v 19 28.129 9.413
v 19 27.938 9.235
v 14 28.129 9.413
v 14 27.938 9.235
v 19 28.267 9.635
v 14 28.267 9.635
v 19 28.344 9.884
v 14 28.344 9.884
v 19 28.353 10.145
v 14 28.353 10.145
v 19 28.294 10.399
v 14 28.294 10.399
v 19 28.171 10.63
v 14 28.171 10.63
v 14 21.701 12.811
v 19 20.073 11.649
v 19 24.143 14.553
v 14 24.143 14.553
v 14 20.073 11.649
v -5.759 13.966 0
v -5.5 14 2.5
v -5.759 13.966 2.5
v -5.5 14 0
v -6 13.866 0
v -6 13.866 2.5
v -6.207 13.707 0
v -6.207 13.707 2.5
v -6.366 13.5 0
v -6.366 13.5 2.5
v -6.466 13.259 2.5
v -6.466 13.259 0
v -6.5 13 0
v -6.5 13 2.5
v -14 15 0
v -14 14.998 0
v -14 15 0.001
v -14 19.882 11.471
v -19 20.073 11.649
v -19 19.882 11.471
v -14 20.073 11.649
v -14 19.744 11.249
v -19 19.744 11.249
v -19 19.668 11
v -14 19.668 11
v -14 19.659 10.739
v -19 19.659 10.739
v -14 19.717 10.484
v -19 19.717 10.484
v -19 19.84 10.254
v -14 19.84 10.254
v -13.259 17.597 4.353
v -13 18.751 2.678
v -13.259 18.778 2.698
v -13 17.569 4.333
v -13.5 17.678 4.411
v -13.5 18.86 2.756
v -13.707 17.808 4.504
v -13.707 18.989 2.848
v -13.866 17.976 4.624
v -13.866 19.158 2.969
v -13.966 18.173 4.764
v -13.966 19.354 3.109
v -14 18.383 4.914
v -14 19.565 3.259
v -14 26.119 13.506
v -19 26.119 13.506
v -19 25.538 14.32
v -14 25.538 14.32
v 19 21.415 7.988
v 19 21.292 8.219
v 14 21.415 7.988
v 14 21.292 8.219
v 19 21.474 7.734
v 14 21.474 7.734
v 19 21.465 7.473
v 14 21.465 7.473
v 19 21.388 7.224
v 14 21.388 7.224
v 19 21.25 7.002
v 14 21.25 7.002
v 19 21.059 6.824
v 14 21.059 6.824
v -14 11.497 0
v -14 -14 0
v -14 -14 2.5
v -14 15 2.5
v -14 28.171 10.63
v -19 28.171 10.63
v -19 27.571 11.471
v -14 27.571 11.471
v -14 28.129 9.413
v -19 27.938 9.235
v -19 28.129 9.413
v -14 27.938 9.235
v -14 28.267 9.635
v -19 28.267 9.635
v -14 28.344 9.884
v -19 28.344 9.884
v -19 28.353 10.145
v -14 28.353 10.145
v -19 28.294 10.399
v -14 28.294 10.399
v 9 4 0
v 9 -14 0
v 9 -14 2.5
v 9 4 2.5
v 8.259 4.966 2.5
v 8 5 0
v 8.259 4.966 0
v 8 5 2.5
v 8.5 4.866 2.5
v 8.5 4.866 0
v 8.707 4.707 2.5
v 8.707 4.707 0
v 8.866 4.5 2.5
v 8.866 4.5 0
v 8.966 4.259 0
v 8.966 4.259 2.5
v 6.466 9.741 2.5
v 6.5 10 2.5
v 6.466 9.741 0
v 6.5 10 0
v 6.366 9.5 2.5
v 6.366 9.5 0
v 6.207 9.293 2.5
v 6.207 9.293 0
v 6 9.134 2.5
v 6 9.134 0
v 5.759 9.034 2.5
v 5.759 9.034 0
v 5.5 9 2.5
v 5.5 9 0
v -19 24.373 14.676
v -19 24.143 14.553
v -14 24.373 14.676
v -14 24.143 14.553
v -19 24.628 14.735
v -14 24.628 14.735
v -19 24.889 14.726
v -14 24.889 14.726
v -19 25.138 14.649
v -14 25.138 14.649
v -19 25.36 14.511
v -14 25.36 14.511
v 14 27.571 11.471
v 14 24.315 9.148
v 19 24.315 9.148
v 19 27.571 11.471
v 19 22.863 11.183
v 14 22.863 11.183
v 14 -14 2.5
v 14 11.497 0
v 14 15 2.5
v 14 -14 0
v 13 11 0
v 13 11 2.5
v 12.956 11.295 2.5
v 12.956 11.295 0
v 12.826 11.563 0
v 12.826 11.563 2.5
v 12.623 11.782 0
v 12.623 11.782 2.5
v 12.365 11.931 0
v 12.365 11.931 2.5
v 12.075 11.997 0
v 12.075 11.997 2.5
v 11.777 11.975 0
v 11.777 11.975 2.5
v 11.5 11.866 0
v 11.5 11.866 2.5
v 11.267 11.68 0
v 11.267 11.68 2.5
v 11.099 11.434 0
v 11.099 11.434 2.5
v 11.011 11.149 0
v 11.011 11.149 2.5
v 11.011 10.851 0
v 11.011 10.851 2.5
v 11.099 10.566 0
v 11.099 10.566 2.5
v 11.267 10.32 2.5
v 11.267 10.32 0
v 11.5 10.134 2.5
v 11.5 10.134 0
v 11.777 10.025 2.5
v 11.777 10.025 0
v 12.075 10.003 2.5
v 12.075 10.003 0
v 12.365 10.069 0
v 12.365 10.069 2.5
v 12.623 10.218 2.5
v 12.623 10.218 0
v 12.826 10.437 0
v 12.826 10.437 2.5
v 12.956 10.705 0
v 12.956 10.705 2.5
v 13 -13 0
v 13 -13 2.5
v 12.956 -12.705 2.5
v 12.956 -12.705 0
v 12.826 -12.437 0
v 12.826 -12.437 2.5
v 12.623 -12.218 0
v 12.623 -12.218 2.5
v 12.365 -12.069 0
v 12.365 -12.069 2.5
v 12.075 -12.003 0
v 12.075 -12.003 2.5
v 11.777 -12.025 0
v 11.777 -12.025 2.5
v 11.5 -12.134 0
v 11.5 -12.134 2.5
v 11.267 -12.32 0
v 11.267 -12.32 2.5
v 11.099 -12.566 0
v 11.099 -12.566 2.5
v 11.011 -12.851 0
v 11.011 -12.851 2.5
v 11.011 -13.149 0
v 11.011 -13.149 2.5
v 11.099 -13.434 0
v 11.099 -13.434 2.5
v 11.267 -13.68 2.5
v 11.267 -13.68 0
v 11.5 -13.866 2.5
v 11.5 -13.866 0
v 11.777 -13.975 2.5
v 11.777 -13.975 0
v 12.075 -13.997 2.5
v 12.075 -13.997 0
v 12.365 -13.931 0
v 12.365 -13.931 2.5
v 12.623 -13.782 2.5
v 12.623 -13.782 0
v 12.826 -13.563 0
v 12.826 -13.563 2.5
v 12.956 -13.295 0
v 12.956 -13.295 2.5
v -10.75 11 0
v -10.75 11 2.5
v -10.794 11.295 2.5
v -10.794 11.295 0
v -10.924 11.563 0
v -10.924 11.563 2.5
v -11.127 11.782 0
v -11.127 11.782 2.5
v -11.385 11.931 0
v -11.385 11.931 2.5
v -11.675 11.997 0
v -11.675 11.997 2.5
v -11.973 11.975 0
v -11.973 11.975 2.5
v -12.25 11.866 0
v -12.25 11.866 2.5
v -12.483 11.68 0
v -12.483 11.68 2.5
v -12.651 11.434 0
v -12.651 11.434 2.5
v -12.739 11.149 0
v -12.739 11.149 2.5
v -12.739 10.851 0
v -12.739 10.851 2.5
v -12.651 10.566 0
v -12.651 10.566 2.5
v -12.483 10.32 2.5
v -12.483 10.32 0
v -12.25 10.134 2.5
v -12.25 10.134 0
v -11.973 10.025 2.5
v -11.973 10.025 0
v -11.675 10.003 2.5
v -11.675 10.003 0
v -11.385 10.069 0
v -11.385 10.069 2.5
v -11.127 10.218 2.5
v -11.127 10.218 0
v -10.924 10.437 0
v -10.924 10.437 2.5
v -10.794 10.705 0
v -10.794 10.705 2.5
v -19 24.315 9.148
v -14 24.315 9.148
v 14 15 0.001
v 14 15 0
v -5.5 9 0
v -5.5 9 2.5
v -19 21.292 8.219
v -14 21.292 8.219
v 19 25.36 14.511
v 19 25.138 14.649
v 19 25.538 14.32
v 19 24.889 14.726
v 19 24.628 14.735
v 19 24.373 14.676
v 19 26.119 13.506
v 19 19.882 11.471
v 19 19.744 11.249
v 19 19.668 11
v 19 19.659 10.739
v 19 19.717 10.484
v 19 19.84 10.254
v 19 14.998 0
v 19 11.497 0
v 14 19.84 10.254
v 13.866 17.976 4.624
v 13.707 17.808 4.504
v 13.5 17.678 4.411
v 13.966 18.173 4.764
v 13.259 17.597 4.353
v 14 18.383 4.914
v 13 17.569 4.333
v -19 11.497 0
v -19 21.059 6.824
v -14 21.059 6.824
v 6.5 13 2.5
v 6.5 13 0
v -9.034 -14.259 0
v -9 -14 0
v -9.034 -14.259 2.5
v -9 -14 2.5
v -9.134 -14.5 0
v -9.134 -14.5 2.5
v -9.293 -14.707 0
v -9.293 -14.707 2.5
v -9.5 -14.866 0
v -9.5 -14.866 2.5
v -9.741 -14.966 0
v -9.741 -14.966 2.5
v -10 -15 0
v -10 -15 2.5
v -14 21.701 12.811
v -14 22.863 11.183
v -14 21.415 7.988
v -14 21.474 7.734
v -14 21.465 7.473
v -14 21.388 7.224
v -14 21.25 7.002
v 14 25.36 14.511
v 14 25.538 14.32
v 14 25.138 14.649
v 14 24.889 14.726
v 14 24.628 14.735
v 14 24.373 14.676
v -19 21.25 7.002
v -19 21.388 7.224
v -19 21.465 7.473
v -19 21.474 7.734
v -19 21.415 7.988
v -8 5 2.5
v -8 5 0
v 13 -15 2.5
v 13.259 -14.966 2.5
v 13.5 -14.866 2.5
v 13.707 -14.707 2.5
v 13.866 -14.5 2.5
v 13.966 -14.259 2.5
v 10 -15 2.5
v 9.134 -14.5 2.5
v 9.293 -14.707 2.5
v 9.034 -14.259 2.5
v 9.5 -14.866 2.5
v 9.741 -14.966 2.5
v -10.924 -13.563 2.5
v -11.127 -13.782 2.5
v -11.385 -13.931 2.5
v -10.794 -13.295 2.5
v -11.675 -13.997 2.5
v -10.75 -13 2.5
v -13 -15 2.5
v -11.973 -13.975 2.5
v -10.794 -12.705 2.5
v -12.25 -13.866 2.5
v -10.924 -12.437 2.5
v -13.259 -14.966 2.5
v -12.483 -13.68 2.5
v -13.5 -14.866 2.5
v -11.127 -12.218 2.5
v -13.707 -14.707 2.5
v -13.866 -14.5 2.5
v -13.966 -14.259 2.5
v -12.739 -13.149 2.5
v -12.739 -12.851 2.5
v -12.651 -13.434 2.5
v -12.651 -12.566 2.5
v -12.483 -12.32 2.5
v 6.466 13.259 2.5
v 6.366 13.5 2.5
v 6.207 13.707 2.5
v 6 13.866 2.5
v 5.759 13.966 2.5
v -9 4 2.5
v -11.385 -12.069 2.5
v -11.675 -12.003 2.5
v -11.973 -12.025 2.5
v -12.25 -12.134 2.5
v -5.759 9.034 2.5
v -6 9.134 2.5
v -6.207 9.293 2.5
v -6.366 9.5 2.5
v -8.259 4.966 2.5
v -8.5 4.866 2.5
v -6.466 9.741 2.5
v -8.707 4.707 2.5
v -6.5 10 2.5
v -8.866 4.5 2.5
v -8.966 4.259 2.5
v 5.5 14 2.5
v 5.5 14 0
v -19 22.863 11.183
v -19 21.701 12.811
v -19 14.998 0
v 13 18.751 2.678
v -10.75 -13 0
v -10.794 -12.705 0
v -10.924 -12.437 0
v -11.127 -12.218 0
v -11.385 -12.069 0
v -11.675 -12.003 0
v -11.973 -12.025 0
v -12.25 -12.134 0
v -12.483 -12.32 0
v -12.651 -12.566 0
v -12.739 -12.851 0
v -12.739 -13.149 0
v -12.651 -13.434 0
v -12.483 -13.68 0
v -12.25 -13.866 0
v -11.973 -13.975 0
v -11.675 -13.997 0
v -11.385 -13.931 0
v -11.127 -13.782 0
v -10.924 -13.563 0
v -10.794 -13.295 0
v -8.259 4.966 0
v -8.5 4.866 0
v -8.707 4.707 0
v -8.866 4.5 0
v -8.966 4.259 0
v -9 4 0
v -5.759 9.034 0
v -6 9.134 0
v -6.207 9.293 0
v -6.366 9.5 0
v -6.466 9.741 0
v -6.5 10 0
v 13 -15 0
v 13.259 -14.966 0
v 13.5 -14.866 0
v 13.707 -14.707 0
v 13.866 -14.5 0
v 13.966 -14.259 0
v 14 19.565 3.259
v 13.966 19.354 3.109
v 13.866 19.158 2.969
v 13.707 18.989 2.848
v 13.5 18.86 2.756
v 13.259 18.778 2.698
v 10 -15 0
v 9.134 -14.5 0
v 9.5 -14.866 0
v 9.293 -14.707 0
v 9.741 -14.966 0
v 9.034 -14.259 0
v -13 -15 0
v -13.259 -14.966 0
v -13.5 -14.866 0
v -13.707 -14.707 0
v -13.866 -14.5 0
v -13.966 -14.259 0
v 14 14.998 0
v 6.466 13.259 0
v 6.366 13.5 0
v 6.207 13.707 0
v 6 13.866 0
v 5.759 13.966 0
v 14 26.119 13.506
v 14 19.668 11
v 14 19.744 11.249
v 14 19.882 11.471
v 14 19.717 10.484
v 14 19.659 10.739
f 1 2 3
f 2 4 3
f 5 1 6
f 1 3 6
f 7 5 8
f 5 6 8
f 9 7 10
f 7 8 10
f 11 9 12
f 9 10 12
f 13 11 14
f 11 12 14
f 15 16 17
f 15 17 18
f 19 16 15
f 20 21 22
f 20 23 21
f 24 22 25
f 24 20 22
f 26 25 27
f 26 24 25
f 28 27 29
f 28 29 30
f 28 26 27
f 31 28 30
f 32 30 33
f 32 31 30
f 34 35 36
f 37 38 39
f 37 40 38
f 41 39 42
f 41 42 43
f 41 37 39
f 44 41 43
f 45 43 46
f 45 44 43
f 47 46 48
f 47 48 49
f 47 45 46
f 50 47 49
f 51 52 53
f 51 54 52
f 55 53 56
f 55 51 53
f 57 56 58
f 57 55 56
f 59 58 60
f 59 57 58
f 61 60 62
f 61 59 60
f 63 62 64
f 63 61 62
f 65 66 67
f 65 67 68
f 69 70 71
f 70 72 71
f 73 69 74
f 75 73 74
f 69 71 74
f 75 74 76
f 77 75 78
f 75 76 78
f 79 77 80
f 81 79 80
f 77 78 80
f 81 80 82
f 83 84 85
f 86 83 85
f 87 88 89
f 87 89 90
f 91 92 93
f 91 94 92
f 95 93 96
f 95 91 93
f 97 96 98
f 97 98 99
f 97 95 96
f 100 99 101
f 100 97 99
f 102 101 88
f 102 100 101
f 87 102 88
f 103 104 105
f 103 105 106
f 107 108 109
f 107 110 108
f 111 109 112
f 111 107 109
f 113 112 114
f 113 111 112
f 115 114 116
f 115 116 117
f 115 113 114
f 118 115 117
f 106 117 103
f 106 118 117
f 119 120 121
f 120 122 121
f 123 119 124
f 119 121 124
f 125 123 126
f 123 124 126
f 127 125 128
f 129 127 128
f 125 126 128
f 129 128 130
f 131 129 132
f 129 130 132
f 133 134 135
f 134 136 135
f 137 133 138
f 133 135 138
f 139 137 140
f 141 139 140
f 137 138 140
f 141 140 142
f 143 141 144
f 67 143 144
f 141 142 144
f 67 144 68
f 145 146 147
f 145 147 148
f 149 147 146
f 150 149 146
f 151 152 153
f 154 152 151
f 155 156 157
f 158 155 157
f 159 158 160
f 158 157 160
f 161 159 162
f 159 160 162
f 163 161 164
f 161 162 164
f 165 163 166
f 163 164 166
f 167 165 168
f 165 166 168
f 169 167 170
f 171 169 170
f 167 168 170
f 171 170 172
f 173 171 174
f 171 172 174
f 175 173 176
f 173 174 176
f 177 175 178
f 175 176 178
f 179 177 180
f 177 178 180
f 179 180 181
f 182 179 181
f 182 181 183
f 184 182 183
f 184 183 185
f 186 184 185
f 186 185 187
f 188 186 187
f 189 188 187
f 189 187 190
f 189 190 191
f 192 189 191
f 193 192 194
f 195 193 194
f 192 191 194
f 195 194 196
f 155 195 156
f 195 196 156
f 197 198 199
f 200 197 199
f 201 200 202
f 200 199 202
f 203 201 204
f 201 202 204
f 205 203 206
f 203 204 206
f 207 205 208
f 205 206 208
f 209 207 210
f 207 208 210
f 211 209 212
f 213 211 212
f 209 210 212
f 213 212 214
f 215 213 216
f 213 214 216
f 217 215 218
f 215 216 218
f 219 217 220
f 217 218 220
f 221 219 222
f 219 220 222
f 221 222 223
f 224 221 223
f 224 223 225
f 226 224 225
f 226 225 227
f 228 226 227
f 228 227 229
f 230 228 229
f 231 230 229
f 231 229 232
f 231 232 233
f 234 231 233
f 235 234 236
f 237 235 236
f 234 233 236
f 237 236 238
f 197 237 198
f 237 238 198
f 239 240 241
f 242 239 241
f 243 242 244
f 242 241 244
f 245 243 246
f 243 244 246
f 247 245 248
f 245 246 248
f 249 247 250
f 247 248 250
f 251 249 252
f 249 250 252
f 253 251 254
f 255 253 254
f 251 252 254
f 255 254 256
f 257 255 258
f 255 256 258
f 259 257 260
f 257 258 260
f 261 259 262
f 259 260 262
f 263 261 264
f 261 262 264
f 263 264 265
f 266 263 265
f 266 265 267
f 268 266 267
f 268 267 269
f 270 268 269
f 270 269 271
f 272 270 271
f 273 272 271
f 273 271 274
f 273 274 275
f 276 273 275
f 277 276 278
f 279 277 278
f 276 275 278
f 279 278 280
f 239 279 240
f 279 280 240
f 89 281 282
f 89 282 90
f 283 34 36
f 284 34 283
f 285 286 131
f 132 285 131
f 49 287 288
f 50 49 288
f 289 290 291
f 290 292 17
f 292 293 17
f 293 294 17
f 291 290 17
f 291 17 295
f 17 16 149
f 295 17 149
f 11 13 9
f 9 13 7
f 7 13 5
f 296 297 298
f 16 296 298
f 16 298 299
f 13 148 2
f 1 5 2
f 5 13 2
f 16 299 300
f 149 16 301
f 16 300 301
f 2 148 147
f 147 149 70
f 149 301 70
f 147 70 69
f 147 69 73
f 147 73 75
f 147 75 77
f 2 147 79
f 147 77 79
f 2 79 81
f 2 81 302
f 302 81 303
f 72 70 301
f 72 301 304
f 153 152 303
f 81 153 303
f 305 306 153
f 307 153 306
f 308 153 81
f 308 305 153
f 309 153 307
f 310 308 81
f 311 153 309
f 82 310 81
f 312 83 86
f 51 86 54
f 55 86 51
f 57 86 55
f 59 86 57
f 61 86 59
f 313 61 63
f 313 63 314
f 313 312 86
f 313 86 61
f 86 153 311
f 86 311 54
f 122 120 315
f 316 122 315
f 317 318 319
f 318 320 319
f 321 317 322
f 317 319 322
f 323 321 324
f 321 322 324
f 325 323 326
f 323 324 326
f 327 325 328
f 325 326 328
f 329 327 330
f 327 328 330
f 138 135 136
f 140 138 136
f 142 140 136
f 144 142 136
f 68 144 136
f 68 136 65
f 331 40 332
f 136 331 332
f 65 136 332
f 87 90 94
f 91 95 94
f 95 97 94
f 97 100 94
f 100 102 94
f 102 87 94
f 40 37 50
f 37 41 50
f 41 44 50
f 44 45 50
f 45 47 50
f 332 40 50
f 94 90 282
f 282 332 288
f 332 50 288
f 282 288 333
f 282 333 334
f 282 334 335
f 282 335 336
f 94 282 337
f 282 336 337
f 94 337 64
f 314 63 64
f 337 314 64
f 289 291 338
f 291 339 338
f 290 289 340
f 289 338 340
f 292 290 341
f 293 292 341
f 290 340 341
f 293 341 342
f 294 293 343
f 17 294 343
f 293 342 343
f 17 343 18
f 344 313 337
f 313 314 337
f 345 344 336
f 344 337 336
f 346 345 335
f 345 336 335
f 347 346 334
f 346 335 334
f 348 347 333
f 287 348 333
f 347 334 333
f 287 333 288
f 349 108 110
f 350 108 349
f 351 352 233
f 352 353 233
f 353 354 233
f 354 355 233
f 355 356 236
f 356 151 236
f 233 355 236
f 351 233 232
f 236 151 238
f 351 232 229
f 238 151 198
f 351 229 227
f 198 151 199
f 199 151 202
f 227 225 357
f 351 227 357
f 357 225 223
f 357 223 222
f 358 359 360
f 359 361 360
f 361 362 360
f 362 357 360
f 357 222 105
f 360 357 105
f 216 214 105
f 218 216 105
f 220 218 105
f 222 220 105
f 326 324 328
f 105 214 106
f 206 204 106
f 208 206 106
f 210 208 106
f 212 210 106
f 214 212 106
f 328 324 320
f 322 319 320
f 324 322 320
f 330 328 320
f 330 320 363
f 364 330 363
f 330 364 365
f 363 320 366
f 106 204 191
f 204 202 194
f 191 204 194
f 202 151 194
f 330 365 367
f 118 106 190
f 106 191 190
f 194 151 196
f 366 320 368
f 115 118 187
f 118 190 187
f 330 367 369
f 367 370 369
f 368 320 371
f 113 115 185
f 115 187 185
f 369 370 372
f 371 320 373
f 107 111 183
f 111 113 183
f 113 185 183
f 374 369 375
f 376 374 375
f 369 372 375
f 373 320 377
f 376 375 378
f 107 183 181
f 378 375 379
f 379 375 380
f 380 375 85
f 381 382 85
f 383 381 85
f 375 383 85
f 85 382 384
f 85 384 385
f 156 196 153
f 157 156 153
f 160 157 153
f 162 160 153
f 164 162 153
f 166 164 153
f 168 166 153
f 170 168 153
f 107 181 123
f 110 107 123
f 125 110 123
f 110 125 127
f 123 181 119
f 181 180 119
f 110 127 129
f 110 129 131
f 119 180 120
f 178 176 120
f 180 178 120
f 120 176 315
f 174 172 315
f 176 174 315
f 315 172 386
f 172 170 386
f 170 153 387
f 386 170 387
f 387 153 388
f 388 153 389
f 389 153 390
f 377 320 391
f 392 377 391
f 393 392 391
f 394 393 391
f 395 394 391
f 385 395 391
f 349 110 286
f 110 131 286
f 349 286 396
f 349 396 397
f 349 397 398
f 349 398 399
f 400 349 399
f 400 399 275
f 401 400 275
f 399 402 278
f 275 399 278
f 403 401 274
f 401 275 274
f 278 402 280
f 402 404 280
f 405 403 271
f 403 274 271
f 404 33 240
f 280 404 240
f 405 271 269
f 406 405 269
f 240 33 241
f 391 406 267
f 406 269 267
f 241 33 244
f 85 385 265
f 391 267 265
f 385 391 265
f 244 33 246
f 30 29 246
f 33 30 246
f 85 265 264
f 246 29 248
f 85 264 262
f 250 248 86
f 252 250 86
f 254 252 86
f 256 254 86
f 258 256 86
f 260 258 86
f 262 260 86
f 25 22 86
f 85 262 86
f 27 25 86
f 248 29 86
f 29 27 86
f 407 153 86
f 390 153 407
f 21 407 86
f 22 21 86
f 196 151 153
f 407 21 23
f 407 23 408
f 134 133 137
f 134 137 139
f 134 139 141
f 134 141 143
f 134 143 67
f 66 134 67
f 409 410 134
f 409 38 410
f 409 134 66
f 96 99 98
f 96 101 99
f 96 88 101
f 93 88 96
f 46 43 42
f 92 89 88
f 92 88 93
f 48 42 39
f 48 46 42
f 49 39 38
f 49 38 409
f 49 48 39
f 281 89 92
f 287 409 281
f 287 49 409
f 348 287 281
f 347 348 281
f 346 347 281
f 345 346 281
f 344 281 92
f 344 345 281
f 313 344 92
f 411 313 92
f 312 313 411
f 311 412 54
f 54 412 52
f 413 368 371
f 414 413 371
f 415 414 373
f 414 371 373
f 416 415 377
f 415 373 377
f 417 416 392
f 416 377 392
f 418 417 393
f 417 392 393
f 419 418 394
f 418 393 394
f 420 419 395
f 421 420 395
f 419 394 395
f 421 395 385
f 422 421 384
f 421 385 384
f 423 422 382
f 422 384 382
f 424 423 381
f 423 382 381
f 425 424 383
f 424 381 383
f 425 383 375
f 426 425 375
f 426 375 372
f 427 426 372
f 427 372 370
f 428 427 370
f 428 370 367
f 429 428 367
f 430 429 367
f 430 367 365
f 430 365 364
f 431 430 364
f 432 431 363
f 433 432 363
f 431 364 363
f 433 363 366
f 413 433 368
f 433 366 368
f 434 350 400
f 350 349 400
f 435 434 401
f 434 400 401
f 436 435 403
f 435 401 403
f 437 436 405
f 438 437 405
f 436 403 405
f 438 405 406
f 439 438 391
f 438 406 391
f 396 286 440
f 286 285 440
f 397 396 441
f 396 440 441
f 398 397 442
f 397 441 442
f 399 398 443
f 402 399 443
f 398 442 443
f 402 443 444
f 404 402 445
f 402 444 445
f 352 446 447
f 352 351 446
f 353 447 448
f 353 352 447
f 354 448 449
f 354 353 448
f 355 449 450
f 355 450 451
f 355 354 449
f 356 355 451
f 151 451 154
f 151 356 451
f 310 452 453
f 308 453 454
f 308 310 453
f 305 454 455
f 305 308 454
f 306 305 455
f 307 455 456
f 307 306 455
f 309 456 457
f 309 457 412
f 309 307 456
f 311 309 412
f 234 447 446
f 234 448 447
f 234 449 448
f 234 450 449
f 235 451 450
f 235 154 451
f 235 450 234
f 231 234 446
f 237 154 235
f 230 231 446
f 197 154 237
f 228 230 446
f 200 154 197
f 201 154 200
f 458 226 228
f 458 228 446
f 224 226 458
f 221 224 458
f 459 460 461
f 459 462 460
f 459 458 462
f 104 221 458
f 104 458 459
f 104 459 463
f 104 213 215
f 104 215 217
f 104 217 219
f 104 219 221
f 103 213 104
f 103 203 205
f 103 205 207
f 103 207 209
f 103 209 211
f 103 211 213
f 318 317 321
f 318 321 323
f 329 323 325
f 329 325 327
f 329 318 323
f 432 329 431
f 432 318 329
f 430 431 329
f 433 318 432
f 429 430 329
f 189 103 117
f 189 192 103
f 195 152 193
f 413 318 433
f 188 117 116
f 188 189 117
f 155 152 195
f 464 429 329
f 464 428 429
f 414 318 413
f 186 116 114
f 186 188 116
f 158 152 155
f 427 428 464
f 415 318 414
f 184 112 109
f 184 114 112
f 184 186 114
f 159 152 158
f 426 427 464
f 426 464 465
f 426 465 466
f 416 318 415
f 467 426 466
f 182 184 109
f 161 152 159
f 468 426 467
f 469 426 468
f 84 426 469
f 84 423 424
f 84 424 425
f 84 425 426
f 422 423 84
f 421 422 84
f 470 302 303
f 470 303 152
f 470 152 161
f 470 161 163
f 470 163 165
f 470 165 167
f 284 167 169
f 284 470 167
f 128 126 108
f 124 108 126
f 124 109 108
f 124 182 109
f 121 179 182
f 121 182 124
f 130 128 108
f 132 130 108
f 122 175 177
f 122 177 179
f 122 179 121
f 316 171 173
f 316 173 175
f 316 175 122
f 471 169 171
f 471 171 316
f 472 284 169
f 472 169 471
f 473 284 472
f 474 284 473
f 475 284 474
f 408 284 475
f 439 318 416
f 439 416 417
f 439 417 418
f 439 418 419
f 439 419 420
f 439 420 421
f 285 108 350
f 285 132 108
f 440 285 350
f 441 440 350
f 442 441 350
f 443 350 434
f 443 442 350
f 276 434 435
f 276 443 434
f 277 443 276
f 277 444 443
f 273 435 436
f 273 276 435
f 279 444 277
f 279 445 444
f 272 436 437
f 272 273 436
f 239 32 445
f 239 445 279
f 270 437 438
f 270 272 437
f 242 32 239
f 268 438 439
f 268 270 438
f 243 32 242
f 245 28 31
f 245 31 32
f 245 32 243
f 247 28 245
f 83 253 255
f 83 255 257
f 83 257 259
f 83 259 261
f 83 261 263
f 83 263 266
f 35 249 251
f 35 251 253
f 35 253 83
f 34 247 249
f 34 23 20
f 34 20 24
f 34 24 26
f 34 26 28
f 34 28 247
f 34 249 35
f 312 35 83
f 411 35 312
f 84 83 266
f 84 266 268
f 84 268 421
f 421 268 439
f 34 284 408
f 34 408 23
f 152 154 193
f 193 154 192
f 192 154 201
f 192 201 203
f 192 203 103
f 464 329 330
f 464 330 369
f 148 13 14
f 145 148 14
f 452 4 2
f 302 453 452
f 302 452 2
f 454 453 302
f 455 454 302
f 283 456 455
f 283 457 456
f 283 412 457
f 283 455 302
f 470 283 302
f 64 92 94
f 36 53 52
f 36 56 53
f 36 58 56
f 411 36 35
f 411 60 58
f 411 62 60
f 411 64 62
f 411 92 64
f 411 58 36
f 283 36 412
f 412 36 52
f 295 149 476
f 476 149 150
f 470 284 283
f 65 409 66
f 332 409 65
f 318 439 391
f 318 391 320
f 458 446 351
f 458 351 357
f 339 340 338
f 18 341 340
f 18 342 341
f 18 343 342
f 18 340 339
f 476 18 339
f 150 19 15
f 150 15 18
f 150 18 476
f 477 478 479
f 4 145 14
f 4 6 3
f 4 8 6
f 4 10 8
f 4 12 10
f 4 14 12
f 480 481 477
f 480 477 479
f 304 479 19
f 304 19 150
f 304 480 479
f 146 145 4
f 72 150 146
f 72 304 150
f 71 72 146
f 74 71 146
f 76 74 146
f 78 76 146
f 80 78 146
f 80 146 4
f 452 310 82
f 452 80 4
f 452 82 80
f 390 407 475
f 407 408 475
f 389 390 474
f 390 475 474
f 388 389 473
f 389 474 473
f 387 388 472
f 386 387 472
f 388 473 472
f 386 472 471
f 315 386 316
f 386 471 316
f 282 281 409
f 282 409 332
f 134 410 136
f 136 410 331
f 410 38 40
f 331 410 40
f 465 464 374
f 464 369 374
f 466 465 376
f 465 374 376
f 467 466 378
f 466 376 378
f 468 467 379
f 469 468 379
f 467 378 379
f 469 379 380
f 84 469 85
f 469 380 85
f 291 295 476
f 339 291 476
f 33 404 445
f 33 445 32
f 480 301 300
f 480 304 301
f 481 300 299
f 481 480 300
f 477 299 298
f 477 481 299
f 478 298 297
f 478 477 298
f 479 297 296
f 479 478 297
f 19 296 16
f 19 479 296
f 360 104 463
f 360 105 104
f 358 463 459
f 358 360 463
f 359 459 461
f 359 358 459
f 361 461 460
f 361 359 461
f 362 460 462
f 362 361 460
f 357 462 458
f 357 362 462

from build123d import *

# Parameters (mm, degrees)
SALIENTE_EXTRUIR1_DEPTH      = 2.5
SALIENTE_EXTRUIR2_DEPTH      = 19
SALIENTE_EXTRUIR2_DEPTH_BACK = 19
CROQUIS3_R                   = 1
CORTAR_EXTRUIR2_DEPTH        = 2.5
CROQUIS2_W                   = 13
CROQUIS2_H                   = 5
CORTAR_EXTRUIR1_DEPTH        = 3
REDONDEO1_R                  = 1
CROQUIS7_W                   = 28
CROQUIS7_H                   = 15.287444166
CORTAR_EXTRUIR3_DEPTH        = 2.5
CROQUIS8_W                   = 5
CROQUIS8_H                   = 3
CORTAR_EXTRUIR4_DEPTH        = 2.5
REDONDEO2_R                  = 1
CROQUIS9_W                   = 5
CROQUIS9_H                   = 3
SALIENTE_EXTRUIR3_DEPTH      = 4.5
CROQUIS10_W                  = 5
CROQUIS10_H                  = 2
SALIENTE_EXTRUIR4_DEPTH      = 4
REDONDEO3_R                  = 1
REDONDEO3_OF_SIMETR_A3_R     = 1
REDONDEO4_R                  = 1


with BuildPart() as part:
    # Croquis1 → Saliente-Extruir1 (new body)
    with BuildSketch(Plane.XY):
        Polygon((-9, -15), (-14, -15), (-14, 15), (14, 15), (14, -15), (9, -15), (9, 5), (-9, 5), align=None)
    extrude(amount=SALIENTE_EXTRUIR1_DEPTH)

    # Croquis6 → Saliente-Extruir2 (add, two sides)
    with BuildSketch(Plane(origin=(0, 0, 0), x_dir=(0, 0, -1), z_dir=(1, 0, 0))) as saliente_extruir2_sk:
        Polygon((0, 14.99808723), (0, 11.497275395), (-11.558640634, 27.693398632), (-11.558640634, 31.194210467), align=None)
    extrude(amount=SALIENTE_EXTRUIR2_DEPTH)
    extrude(saliente_extruir2_sk.sketch, amount=-SALIENTE_EXTRUIR2_DEPTH_BACK)

    # Croquis3 → Cortar-Extruir2 (cut)
    with BuildSketch(Plane.XY.offset(2.5)):
        with Locations((-11.75, -13)):
            Circle(CROQUIS3_R)
        with Locations((-11.75, 11)):
            Circle(CROQUIS3_R)
        with Locations((12, -13)):
            Circle(CROQUIS3_R)
        with Locations((12, 11)):
            Circle(CROQUIS3_R)
    extrude(amount=-CORTAR_EXTRUIR2_DEPTH, mode=Mode.SUBTRACT)

    # Croquis2 → Cortar-Extruir1 (cut)
    with BuildSketch(Plane.XY.offset(2.5)):
        with Locations((0, 11.5)):
            Rectangle(CROQUIS2_W, CROQUIS2_H)
    extrude(amount=-CORTAR_EXTRUIR1_DEPTH, mode=Mode.SUBTRACT)

    # Redondeo1
    redondeo1_edges = [part.edges().sort_by_distance(p)[0] for p in [
        (14, -15, 1.25),
        (9, -15, 1.25),
        (9, 5, 1.25),
        (-9, 5, 1.25),
        (-9, -15, 1.25),
        (-14, -15, 1.25),
        (-6.5, 9, 1.25),
        (-6.5, 14, 1.25),
        (6.5, 14, 1.25),
        (6.5, 9, 1.25),
    ]]
    fillet(redondeo1_edges, radius=REDONDEO1_R)

    # Croquis7 → Cortar-Extruir3 (cut)
    with BuildSketch(Plane(origin=(0, 5.061109194, -7.091694501), x_dir=(-1, 0, 0), z_dir=(0, 0.580904735, -0.813971553))):
        with Locations((0, 24.46194693)):
            Rectangle(CROQUIS7_W, CROQUIS7_H)
    extrude(amount=-CORTAR_EXTRUIR3_DEPTH, mode=Mode.SUBTRACT)

    # Croquis8 → Cortar-Extruir4 (cut)
    with BuildSketch(Plane(origin=(0, 5.061109194, -7.091694501), x_dir=(-1, 0, 0), z_dir=(0, 0.580904735, -0.813971553))):
        with Locations((-16.5, 30.605669013)):
            Rectangle(CROQUIS8_W, CROQUIS8_H)
    cortar_extruir4 = extrude(amount=-CORTAR_EXTRUIR4_DEPTH, mode=Mode.SUBTRACT)

    # Simetría1: Cortar-Extruir4 across plane
    add(cortar_extruir4.mirror(Plane(origin=(0, 0, 0), x_dir=(0, 0, 1), z_dir=(1, 0, 0))), mode=Mode.SUBTRACT)

    # Redondeo2
    redondeo2_edges = [part.edges().sort_by_distance(p)[0] for p in [
        (16.5, 28.752295807, 9.815926431),
        (-16.5, 28.752295807, 9.815926431),
    ]]
    fillet(redondeo2_edges, radius=REDONDEO2_R)

    # Croquis9 → Saliente-Extruir3 (add)
    with BuildSketch(Plane(origin=(0, 3.879759153, -5.436370882), x_dir=(1, 0, 0), z_dir=(0, -0.580904735, 0.813971553))):
        with Locations((-16.5, 23.605669013)):
            Rectangle(CROQUIS9_W, CROQUIS9_H)
    saliente_extruir3 = extrude(amount=SALIENTE_EXTRUIR3_DEPTH)

    # Croquis10 → Saliente-Extruir4 (add)
    with BuildSketch(Plane(origin=(0, 20.4353004, 14.584001994), x_dir=(1, 0, 0), z_dir=(0, 0.813971553, 0.580904735))):
        with Locations((-16.5, 3.178821712)):
            Rectangle(CROQUIS10_W, CROQUIS10_H)
    saliente_extruir4 = extrude(amount=SALIENTE_EXTRUIR4_DEPTH)

    # Redondeo3
    redondeo3_edges = [part.edges().sort_by_distance(p)[0] for p in [
        (-16.5, 21.873144894, 7.404916908),
        (-16.5, 19.259073588, 11.067788897),
        (-16.5, 24.956874461, 15.134122039),
    ]]
    fillet(redondeo3_edges, radius=REDONDEO3_R)

    # Simetría3: Saliente-Extruir3, Saliente-Extruir4 across plane
    add(saliente_extruir3.mirror(Plane(origin=(0, 0, 0), x_dir=(0, 0, 1), z_dir=(1, 0, 0))))
    add(saliente_extruir4.mirror(Plane(origin=(0, 0, 0), x_dir=(0, 0, 1), z_dir=(1, 0, 0))))

    # Redondeo3 of Simetría3
    redondeo3_of_simetr_a3_edges = [part.edges().sort_by_distance(p)[0] for p in [
        (16.5, 21.873144894, 7.404916908),
        (16.5, 19.259073588, 11.067788897),
        (16.5, 24.956874461, 15.134122039),
    ]]
    fillet(redondeo3_of_simetr_a3_edges, radius=REDONDEO3_OF_SIMETR_A3_R)

    # Redondeo4
    redondeo4_edges = [part.edges().sort_by_distance(p)[0] for p in [
        (14, 18.159990774, 3.505753749),
        (-14, 18.159990774, 3.505753749),
    ]]
    fillet(redondeo4_edges, radius=REDONDEO4_R)


solid = part.part
